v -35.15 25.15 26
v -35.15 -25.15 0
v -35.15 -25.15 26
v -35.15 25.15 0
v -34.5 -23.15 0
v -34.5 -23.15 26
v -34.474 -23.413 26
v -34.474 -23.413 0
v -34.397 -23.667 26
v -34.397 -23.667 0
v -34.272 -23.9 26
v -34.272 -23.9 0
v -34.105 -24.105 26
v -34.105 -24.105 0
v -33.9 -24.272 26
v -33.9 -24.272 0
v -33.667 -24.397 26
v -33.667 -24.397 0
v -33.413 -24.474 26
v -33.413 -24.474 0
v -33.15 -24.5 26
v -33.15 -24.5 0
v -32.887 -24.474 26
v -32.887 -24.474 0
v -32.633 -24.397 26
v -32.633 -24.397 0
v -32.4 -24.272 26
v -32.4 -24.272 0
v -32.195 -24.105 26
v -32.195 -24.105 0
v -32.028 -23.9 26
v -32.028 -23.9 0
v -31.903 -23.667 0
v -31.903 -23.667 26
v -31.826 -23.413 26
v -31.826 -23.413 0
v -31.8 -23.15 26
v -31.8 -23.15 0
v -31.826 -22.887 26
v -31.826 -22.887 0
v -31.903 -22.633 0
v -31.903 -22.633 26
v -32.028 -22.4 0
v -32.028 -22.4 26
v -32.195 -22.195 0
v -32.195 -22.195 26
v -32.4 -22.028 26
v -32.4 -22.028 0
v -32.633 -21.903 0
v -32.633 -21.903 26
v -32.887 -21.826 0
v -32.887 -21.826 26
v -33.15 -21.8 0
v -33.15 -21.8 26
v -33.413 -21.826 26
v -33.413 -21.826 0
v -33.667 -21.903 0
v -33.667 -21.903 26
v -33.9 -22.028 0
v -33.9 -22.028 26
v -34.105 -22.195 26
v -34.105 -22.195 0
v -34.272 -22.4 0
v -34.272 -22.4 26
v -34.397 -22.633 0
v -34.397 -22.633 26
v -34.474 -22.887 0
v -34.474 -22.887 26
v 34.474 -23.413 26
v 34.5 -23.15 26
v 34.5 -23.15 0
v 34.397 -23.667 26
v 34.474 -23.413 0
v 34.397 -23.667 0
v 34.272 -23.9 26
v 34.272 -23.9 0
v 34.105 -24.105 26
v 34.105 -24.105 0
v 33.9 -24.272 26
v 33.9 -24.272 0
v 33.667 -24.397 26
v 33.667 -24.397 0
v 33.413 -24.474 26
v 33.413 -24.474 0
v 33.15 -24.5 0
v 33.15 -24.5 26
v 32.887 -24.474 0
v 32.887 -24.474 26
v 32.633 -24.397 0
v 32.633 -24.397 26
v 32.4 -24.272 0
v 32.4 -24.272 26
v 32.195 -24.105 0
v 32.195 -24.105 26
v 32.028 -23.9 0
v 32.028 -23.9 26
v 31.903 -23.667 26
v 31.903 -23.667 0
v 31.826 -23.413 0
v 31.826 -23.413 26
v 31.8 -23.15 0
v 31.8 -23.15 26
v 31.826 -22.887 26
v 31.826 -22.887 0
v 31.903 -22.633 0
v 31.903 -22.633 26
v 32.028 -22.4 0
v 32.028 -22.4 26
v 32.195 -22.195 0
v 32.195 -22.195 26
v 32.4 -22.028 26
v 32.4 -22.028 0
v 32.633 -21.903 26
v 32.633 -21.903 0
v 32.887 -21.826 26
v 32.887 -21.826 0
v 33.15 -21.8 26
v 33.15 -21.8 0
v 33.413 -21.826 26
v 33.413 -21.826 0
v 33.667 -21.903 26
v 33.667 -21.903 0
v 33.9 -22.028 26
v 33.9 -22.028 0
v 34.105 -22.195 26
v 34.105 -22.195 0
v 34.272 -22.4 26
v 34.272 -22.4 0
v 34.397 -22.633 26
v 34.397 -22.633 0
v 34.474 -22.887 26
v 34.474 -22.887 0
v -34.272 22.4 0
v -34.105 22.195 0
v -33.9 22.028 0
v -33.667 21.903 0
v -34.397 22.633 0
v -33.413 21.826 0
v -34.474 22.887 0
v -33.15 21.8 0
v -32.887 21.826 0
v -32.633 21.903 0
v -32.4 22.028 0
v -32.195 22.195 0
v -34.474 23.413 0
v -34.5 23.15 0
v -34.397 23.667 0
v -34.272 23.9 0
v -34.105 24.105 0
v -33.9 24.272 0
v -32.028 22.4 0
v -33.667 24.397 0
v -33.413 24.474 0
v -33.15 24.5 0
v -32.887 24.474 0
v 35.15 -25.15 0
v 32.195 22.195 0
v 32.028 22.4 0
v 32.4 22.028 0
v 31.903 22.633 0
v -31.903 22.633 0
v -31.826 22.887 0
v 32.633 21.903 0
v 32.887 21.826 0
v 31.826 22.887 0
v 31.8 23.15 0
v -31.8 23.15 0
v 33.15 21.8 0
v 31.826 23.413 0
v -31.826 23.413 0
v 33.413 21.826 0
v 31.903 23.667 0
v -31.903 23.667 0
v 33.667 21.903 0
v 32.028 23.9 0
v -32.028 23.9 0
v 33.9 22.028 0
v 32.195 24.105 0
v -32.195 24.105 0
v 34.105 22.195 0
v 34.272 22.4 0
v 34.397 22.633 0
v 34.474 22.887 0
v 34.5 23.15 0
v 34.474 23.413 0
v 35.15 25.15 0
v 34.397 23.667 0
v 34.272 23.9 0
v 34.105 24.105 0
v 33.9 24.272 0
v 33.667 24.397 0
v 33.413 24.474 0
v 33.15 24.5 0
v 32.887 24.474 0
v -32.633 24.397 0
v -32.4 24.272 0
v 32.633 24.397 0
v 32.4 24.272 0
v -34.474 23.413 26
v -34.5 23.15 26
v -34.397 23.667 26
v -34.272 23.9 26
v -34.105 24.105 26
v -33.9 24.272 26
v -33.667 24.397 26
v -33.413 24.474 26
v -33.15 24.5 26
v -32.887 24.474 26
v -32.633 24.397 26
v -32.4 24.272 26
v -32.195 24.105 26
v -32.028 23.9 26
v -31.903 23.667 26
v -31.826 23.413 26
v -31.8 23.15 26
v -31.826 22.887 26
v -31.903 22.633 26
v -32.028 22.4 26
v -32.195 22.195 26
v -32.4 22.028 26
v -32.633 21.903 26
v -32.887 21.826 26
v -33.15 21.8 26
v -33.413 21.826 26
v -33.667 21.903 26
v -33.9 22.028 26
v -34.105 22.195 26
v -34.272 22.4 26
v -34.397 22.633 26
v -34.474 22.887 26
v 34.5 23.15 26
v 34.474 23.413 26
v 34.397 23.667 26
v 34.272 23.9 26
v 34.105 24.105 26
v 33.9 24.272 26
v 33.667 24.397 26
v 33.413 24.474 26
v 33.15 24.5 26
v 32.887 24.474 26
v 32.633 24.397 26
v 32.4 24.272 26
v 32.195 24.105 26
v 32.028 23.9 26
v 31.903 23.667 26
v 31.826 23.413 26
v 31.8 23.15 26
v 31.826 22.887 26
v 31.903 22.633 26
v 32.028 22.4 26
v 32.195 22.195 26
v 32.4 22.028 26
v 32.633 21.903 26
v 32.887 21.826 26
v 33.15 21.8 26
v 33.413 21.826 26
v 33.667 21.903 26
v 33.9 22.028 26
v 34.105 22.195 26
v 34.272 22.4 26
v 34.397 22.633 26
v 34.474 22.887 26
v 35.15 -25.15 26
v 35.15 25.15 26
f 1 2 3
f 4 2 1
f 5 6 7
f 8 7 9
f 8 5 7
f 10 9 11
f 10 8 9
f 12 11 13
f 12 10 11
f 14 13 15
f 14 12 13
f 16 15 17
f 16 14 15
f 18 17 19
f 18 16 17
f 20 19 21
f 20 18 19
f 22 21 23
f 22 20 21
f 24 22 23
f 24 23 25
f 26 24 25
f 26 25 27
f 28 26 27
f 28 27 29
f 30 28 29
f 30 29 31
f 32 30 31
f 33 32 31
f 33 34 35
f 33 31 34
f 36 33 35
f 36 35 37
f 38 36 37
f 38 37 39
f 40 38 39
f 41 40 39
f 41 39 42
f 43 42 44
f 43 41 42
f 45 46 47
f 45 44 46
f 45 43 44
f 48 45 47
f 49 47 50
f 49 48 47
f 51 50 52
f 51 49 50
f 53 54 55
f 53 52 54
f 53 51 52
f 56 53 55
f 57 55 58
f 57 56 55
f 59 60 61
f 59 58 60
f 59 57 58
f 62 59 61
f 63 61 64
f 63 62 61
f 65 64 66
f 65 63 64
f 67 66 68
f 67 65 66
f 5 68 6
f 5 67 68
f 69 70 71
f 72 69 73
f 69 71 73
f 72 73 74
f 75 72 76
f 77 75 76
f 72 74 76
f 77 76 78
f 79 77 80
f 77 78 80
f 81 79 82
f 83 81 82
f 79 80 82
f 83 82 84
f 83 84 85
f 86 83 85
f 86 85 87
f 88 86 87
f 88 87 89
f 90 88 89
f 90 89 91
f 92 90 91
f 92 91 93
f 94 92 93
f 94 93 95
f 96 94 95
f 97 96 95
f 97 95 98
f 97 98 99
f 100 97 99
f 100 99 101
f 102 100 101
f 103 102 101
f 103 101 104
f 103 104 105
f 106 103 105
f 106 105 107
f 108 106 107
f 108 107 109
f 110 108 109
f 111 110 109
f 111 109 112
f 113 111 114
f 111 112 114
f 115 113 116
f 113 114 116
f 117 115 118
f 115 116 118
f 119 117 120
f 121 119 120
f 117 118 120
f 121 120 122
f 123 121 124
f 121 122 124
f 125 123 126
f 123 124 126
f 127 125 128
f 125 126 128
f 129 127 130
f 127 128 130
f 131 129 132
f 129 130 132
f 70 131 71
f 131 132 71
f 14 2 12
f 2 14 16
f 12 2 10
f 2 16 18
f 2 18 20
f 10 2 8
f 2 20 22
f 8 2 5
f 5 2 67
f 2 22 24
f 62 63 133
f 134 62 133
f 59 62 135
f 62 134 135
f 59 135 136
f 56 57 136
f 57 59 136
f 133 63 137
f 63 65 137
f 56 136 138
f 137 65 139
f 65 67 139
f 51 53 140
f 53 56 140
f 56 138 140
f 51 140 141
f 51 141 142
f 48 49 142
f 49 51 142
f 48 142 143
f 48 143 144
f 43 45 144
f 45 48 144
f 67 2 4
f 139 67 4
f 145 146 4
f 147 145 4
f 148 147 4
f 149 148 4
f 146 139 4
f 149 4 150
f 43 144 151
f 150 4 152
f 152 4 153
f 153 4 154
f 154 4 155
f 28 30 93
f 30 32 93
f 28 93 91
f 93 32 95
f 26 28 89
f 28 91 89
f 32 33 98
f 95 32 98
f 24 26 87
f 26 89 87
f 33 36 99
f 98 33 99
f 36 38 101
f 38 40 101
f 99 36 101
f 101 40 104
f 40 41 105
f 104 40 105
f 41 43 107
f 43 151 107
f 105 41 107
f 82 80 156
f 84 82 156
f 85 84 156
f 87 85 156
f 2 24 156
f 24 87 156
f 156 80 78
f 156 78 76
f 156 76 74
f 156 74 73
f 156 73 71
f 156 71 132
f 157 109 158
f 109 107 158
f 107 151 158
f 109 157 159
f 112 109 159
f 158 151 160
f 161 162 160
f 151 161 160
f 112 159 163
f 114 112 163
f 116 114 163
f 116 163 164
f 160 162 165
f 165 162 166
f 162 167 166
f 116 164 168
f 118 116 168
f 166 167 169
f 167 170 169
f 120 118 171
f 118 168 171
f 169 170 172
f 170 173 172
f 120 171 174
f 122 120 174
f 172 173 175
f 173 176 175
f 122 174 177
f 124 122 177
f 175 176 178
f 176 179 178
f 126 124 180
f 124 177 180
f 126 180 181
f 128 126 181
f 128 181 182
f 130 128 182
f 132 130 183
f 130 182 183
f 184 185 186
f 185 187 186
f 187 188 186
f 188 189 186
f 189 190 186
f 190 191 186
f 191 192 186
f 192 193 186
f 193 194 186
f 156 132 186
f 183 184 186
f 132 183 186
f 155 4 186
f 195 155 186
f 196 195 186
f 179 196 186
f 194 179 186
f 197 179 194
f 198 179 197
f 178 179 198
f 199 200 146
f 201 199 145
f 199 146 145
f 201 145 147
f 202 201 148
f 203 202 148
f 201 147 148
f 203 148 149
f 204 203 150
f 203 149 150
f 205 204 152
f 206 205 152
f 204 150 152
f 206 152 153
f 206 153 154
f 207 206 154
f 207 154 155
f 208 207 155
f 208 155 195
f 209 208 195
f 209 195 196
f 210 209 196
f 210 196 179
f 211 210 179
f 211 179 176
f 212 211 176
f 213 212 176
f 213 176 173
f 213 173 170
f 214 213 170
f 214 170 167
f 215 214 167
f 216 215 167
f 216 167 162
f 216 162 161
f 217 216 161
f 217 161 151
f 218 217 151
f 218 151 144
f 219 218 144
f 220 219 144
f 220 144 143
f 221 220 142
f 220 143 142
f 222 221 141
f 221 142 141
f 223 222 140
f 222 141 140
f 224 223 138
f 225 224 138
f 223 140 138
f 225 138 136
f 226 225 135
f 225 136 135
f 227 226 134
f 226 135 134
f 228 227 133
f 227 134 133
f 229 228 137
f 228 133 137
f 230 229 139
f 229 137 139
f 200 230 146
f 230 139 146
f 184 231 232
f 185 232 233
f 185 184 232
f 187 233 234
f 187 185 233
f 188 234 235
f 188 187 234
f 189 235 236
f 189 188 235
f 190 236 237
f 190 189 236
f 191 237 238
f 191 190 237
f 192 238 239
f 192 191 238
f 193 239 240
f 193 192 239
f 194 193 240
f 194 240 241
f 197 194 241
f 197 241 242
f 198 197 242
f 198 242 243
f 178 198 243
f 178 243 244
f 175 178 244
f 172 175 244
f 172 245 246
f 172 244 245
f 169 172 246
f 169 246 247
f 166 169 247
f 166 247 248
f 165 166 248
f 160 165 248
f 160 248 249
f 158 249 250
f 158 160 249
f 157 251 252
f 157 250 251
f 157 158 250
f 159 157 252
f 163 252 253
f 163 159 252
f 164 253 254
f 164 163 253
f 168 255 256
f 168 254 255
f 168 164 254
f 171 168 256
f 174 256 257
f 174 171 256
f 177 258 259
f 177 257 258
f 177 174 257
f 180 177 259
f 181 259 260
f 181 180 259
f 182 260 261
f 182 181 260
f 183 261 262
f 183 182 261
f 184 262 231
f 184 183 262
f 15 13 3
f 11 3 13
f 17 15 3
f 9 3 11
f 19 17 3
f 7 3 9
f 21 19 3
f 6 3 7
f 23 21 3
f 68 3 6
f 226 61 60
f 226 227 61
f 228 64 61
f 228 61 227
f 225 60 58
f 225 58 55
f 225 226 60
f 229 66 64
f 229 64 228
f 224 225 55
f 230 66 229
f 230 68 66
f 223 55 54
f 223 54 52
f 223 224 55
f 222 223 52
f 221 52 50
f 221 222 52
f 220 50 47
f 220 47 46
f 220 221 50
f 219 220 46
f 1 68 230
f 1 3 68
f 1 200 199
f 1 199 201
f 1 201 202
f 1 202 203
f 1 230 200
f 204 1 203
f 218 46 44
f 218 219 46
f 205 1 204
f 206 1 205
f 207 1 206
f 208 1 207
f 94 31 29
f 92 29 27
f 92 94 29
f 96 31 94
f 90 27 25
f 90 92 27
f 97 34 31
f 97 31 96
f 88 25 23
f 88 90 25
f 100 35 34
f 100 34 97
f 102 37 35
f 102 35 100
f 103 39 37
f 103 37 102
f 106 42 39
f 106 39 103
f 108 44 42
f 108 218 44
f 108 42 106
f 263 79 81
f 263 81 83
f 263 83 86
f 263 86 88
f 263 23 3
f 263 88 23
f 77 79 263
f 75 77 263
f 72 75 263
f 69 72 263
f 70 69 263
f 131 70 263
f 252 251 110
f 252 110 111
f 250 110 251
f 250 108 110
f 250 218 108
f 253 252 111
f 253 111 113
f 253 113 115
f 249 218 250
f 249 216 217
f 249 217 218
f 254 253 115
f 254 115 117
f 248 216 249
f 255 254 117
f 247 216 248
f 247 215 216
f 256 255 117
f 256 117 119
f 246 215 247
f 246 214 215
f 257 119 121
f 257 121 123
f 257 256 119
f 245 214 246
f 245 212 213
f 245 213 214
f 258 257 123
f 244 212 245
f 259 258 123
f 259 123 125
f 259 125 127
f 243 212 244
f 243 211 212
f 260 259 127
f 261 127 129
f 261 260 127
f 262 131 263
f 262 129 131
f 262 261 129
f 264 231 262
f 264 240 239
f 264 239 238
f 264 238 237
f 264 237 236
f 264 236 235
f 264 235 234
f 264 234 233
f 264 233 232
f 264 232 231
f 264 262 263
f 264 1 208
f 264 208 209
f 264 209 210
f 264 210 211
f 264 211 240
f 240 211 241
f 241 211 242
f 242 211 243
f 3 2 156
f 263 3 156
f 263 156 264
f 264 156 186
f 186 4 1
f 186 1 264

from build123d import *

# Parameters (mm, degrees)
SKETCH_W                = 70.3
SKETCH_H                = 50.3
PAD_DEPTH               = 26
SKETCH001_R             = 1.35
POCKET_DEPTH            = 206.53554
SKETCH001_MIRRORED_2_R  = 1.35
POCKET_MIRRORED_2_DEPTH = 206.53554


with BuildPart() as part:
    # Sketch → Pad (new body)
    with BuildSketch(Plane.XY):
        Rectangle(SKETCH_W, SKETCH_H)
    extrude(amount=PAD_DEPTH)

    # Sketch001 → Pocket (cut, through all)
    with BuildSketch(Plane.XY):
        with Locations((33.15, 23.15)):
            Circle(SKETCH001_R)
    pocket = extrude(amount=POCKET_DEPTH, mode=Mode.SUBTRACT)

    # Sketch001 Mirrored 2 → Pocket Mirrored 2 (cut, through all)
    with BuildSketch(Plane(origin=(0, 0, 0), x_dir=(-1, 0, 0), z_dir=(0, 0, -1))):
        with Locations((33.15, 23.15)):
            Circle(SKETCH001_MIRRORED_2_R)
    pocket_mirrored_2 = extrude(amount=-POCKET_MIRRORED_2_DEPTH, mode=Mode.SUBTRACT)

    # Mirrored001: Pocket, Pocket Mirrored 2 across Sketch001 H_Axis
    add(pocket.mirror(Plane.ZX), mode=Mode.SUBTRACT)
    add(pocket_mirrored_2.mirror(Plane.ZX), mode=Mode.SUBTRACT)


solid = part.part
